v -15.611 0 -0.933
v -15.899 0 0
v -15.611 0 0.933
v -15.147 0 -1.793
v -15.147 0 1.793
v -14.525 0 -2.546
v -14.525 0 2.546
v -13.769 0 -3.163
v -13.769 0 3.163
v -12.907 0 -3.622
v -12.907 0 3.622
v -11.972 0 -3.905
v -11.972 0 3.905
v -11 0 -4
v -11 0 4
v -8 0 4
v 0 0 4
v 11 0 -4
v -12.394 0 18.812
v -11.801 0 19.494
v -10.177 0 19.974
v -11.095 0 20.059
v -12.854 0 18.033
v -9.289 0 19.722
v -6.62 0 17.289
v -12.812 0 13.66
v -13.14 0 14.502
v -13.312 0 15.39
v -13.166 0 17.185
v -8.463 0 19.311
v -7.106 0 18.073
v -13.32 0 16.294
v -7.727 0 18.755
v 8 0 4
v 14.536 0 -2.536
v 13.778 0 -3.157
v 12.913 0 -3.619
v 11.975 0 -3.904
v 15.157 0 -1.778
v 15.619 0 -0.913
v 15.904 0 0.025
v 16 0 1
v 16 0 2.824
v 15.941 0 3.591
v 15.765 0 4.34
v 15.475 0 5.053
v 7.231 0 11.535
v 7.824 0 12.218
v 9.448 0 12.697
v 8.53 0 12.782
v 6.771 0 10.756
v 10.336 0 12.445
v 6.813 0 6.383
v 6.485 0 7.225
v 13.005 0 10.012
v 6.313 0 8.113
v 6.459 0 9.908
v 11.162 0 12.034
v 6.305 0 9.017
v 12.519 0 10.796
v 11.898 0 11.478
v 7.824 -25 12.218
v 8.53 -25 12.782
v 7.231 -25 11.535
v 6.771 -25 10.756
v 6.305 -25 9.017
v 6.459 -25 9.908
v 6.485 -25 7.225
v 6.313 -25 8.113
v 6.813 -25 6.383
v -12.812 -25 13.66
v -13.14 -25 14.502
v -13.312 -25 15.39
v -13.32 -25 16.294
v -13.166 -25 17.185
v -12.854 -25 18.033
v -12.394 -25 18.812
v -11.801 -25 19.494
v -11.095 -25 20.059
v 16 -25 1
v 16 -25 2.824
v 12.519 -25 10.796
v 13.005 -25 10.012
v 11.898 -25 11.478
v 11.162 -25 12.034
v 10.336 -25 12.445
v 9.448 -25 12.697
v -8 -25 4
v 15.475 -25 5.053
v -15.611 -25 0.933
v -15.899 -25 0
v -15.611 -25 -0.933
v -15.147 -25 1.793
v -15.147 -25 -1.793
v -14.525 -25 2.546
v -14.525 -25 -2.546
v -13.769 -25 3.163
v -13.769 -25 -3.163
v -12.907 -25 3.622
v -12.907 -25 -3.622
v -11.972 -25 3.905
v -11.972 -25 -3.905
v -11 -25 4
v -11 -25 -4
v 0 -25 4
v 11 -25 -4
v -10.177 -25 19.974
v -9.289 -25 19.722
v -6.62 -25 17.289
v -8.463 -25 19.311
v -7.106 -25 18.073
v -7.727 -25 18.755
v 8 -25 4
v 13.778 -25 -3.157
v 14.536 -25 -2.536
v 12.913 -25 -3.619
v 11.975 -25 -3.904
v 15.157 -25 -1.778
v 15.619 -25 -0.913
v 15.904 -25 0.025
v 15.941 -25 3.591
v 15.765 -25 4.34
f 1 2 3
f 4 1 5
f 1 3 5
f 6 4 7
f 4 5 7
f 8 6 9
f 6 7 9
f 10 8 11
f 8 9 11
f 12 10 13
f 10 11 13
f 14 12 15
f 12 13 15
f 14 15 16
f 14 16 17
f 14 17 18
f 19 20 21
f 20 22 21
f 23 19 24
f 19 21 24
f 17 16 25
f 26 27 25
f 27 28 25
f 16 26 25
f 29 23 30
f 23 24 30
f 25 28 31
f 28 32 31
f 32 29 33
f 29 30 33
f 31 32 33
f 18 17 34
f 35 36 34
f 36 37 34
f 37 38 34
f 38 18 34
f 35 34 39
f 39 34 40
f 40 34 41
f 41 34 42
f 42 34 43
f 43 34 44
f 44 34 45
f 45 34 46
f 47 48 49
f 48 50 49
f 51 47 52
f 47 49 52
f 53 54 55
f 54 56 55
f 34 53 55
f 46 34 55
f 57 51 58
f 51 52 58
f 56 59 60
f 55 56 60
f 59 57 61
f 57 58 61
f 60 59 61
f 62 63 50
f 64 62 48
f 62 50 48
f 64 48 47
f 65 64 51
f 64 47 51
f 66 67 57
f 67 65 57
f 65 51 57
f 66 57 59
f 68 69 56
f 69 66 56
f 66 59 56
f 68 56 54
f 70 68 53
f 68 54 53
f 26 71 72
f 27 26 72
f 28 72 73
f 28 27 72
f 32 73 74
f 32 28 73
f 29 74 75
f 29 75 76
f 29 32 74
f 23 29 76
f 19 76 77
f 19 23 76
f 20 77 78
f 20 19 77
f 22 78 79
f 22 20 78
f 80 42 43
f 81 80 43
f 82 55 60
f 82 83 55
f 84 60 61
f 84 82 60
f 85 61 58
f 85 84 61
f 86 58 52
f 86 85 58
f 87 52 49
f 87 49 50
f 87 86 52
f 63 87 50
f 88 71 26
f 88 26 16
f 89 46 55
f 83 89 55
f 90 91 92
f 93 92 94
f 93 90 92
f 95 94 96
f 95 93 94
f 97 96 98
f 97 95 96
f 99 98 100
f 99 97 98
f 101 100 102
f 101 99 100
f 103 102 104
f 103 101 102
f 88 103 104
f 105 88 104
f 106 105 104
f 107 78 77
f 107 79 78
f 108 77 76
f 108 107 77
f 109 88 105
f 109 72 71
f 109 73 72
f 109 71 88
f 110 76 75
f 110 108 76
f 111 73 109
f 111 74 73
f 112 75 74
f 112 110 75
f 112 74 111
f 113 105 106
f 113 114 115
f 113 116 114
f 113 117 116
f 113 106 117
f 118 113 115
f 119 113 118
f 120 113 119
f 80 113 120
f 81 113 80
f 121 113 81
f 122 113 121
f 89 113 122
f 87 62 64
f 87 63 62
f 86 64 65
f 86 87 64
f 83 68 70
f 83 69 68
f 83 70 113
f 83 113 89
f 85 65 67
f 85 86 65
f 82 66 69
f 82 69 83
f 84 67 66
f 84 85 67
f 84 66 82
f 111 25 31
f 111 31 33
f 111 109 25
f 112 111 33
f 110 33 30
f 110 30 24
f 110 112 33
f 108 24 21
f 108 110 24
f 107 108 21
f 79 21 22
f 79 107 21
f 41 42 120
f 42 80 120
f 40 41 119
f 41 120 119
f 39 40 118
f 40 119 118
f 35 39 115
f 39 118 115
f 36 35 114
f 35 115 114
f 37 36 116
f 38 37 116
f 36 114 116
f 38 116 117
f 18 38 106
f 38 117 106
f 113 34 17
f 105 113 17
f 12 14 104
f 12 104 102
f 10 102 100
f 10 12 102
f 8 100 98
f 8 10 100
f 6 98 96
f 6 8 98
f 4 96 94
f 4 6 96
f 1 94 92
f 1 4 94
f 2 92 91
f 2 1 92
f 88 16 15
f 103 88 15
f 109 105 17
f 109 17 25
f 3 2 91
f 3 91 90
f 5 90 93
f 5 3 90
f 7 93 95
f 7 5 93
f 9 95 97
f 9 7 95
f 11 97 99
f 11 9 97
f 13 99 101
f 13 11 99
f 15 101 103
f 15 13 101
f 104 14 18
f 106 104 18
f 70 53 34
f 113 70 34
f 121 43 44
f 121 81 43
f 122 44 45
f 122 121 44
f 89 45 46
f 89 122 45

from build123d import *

# Parameters (mm, degrees)
F1_DEPTH    = 25
F2_R        = 5
F3_T1_DEPTH = 60.7481164893
F3_T3_DEPTH = 50
F4_R        = 5


# Not quite as in the source:
# - a fillet or chamfer that OpenCascade refuses, or shapes differently, is made with other operations: its cross-section is extruded or revolved along the edge and cut away or added


with BuildPart() as f1:
    # F0 (on Front) → F1 (new body)
    with BuildSketch(Plane.XZ):
        Polygon((-16, -4), (16, -4), (16, 4), (8, 4), (0, 4), (-8, 4), (-16, 4), align=None)
        Polygon((8, 4), (16, 4), (11.6250231628, 12.7824456607), (3.6250231628, 12.7824456607), align=None)
        Polygon((-16, 20.0594142323), (-8, 4), (0, 4), (-8, 20.0594142323), align=None)
    extrude(amount=F1_DEPTH)

    # F2
    f2_edges = [f1.edges().sort_by_distance(p)[0] for p in [
        (-8, -12.5, 20.059414),
        (11.625023, -12.5, 12.782446),
        (16, -12.5, 4),
    ]]
    fillet(f2_edges, radius=F2_R)

    # F3: fillet of radius 5 on 4 edges, made by hand

    # F3_s2 → F3_t1 (cut)
    with BuildSketch(Plane.XZ.offset(-17.8740582446)):
        with BuildLine():
            ThreePointArc((8.529734301, 12.7824456607), (6.4591533037, 9.9078621452), (6.812957963, 6.3828999728))
            Line((6.812957963, 6.3828999728), (3.6250231628, 12.7824456607))
            Line((3.6250231628, 12.7824456607), (8.529734301, 12.7824456607))
        make_face()
        with BuildLine():
            ThreePointArc((-12.8120651998, 13.6598685445), (-13.1658698591, 17.1848307168), (-11.0952888618, 20.0594142323))
            Line((-11.0952888618, 20.0594142323), (-16, 20.0594142323))
            Line((-16, 20.0594142323), (-12.8120651998, 13.6598685445))
        make_face()
    extrude(amount=F3_T1_DEPTH, mode=Mode.SUBTRACT)

    # F3_s4 → F3_t3 (cut)
    with BuildSketch(Plane.XZ.offset(-12.5)):
        with BuildLine():
            ThreePointArc((-16, -1), (-14.5355339059, 2.5355339059), (-11, 4))
            Line((-11, 4), (-16, 4))
            Line((-16, 4), (-16, -1))
        make_face()
        with BuildLine():
            ThreePointArc((-11, -4), (-14.5355339059, -2.5355339059), (-16, 1))
            Line((-16, 1), (-16, -4))
            Line((-16, -4), (-11, -4))
        make_face()
    extrude(amount=F3_T3_DEPTH, mode=Mode.SUBTRACT)

    # F4
    f4_edges = [f1.edges().sort_by_distance(p)[0] for p in [
        (16, -12.5, -4),
    ]]
    fillet(f4_edges, radius=F4_R)


solid = f1.part
